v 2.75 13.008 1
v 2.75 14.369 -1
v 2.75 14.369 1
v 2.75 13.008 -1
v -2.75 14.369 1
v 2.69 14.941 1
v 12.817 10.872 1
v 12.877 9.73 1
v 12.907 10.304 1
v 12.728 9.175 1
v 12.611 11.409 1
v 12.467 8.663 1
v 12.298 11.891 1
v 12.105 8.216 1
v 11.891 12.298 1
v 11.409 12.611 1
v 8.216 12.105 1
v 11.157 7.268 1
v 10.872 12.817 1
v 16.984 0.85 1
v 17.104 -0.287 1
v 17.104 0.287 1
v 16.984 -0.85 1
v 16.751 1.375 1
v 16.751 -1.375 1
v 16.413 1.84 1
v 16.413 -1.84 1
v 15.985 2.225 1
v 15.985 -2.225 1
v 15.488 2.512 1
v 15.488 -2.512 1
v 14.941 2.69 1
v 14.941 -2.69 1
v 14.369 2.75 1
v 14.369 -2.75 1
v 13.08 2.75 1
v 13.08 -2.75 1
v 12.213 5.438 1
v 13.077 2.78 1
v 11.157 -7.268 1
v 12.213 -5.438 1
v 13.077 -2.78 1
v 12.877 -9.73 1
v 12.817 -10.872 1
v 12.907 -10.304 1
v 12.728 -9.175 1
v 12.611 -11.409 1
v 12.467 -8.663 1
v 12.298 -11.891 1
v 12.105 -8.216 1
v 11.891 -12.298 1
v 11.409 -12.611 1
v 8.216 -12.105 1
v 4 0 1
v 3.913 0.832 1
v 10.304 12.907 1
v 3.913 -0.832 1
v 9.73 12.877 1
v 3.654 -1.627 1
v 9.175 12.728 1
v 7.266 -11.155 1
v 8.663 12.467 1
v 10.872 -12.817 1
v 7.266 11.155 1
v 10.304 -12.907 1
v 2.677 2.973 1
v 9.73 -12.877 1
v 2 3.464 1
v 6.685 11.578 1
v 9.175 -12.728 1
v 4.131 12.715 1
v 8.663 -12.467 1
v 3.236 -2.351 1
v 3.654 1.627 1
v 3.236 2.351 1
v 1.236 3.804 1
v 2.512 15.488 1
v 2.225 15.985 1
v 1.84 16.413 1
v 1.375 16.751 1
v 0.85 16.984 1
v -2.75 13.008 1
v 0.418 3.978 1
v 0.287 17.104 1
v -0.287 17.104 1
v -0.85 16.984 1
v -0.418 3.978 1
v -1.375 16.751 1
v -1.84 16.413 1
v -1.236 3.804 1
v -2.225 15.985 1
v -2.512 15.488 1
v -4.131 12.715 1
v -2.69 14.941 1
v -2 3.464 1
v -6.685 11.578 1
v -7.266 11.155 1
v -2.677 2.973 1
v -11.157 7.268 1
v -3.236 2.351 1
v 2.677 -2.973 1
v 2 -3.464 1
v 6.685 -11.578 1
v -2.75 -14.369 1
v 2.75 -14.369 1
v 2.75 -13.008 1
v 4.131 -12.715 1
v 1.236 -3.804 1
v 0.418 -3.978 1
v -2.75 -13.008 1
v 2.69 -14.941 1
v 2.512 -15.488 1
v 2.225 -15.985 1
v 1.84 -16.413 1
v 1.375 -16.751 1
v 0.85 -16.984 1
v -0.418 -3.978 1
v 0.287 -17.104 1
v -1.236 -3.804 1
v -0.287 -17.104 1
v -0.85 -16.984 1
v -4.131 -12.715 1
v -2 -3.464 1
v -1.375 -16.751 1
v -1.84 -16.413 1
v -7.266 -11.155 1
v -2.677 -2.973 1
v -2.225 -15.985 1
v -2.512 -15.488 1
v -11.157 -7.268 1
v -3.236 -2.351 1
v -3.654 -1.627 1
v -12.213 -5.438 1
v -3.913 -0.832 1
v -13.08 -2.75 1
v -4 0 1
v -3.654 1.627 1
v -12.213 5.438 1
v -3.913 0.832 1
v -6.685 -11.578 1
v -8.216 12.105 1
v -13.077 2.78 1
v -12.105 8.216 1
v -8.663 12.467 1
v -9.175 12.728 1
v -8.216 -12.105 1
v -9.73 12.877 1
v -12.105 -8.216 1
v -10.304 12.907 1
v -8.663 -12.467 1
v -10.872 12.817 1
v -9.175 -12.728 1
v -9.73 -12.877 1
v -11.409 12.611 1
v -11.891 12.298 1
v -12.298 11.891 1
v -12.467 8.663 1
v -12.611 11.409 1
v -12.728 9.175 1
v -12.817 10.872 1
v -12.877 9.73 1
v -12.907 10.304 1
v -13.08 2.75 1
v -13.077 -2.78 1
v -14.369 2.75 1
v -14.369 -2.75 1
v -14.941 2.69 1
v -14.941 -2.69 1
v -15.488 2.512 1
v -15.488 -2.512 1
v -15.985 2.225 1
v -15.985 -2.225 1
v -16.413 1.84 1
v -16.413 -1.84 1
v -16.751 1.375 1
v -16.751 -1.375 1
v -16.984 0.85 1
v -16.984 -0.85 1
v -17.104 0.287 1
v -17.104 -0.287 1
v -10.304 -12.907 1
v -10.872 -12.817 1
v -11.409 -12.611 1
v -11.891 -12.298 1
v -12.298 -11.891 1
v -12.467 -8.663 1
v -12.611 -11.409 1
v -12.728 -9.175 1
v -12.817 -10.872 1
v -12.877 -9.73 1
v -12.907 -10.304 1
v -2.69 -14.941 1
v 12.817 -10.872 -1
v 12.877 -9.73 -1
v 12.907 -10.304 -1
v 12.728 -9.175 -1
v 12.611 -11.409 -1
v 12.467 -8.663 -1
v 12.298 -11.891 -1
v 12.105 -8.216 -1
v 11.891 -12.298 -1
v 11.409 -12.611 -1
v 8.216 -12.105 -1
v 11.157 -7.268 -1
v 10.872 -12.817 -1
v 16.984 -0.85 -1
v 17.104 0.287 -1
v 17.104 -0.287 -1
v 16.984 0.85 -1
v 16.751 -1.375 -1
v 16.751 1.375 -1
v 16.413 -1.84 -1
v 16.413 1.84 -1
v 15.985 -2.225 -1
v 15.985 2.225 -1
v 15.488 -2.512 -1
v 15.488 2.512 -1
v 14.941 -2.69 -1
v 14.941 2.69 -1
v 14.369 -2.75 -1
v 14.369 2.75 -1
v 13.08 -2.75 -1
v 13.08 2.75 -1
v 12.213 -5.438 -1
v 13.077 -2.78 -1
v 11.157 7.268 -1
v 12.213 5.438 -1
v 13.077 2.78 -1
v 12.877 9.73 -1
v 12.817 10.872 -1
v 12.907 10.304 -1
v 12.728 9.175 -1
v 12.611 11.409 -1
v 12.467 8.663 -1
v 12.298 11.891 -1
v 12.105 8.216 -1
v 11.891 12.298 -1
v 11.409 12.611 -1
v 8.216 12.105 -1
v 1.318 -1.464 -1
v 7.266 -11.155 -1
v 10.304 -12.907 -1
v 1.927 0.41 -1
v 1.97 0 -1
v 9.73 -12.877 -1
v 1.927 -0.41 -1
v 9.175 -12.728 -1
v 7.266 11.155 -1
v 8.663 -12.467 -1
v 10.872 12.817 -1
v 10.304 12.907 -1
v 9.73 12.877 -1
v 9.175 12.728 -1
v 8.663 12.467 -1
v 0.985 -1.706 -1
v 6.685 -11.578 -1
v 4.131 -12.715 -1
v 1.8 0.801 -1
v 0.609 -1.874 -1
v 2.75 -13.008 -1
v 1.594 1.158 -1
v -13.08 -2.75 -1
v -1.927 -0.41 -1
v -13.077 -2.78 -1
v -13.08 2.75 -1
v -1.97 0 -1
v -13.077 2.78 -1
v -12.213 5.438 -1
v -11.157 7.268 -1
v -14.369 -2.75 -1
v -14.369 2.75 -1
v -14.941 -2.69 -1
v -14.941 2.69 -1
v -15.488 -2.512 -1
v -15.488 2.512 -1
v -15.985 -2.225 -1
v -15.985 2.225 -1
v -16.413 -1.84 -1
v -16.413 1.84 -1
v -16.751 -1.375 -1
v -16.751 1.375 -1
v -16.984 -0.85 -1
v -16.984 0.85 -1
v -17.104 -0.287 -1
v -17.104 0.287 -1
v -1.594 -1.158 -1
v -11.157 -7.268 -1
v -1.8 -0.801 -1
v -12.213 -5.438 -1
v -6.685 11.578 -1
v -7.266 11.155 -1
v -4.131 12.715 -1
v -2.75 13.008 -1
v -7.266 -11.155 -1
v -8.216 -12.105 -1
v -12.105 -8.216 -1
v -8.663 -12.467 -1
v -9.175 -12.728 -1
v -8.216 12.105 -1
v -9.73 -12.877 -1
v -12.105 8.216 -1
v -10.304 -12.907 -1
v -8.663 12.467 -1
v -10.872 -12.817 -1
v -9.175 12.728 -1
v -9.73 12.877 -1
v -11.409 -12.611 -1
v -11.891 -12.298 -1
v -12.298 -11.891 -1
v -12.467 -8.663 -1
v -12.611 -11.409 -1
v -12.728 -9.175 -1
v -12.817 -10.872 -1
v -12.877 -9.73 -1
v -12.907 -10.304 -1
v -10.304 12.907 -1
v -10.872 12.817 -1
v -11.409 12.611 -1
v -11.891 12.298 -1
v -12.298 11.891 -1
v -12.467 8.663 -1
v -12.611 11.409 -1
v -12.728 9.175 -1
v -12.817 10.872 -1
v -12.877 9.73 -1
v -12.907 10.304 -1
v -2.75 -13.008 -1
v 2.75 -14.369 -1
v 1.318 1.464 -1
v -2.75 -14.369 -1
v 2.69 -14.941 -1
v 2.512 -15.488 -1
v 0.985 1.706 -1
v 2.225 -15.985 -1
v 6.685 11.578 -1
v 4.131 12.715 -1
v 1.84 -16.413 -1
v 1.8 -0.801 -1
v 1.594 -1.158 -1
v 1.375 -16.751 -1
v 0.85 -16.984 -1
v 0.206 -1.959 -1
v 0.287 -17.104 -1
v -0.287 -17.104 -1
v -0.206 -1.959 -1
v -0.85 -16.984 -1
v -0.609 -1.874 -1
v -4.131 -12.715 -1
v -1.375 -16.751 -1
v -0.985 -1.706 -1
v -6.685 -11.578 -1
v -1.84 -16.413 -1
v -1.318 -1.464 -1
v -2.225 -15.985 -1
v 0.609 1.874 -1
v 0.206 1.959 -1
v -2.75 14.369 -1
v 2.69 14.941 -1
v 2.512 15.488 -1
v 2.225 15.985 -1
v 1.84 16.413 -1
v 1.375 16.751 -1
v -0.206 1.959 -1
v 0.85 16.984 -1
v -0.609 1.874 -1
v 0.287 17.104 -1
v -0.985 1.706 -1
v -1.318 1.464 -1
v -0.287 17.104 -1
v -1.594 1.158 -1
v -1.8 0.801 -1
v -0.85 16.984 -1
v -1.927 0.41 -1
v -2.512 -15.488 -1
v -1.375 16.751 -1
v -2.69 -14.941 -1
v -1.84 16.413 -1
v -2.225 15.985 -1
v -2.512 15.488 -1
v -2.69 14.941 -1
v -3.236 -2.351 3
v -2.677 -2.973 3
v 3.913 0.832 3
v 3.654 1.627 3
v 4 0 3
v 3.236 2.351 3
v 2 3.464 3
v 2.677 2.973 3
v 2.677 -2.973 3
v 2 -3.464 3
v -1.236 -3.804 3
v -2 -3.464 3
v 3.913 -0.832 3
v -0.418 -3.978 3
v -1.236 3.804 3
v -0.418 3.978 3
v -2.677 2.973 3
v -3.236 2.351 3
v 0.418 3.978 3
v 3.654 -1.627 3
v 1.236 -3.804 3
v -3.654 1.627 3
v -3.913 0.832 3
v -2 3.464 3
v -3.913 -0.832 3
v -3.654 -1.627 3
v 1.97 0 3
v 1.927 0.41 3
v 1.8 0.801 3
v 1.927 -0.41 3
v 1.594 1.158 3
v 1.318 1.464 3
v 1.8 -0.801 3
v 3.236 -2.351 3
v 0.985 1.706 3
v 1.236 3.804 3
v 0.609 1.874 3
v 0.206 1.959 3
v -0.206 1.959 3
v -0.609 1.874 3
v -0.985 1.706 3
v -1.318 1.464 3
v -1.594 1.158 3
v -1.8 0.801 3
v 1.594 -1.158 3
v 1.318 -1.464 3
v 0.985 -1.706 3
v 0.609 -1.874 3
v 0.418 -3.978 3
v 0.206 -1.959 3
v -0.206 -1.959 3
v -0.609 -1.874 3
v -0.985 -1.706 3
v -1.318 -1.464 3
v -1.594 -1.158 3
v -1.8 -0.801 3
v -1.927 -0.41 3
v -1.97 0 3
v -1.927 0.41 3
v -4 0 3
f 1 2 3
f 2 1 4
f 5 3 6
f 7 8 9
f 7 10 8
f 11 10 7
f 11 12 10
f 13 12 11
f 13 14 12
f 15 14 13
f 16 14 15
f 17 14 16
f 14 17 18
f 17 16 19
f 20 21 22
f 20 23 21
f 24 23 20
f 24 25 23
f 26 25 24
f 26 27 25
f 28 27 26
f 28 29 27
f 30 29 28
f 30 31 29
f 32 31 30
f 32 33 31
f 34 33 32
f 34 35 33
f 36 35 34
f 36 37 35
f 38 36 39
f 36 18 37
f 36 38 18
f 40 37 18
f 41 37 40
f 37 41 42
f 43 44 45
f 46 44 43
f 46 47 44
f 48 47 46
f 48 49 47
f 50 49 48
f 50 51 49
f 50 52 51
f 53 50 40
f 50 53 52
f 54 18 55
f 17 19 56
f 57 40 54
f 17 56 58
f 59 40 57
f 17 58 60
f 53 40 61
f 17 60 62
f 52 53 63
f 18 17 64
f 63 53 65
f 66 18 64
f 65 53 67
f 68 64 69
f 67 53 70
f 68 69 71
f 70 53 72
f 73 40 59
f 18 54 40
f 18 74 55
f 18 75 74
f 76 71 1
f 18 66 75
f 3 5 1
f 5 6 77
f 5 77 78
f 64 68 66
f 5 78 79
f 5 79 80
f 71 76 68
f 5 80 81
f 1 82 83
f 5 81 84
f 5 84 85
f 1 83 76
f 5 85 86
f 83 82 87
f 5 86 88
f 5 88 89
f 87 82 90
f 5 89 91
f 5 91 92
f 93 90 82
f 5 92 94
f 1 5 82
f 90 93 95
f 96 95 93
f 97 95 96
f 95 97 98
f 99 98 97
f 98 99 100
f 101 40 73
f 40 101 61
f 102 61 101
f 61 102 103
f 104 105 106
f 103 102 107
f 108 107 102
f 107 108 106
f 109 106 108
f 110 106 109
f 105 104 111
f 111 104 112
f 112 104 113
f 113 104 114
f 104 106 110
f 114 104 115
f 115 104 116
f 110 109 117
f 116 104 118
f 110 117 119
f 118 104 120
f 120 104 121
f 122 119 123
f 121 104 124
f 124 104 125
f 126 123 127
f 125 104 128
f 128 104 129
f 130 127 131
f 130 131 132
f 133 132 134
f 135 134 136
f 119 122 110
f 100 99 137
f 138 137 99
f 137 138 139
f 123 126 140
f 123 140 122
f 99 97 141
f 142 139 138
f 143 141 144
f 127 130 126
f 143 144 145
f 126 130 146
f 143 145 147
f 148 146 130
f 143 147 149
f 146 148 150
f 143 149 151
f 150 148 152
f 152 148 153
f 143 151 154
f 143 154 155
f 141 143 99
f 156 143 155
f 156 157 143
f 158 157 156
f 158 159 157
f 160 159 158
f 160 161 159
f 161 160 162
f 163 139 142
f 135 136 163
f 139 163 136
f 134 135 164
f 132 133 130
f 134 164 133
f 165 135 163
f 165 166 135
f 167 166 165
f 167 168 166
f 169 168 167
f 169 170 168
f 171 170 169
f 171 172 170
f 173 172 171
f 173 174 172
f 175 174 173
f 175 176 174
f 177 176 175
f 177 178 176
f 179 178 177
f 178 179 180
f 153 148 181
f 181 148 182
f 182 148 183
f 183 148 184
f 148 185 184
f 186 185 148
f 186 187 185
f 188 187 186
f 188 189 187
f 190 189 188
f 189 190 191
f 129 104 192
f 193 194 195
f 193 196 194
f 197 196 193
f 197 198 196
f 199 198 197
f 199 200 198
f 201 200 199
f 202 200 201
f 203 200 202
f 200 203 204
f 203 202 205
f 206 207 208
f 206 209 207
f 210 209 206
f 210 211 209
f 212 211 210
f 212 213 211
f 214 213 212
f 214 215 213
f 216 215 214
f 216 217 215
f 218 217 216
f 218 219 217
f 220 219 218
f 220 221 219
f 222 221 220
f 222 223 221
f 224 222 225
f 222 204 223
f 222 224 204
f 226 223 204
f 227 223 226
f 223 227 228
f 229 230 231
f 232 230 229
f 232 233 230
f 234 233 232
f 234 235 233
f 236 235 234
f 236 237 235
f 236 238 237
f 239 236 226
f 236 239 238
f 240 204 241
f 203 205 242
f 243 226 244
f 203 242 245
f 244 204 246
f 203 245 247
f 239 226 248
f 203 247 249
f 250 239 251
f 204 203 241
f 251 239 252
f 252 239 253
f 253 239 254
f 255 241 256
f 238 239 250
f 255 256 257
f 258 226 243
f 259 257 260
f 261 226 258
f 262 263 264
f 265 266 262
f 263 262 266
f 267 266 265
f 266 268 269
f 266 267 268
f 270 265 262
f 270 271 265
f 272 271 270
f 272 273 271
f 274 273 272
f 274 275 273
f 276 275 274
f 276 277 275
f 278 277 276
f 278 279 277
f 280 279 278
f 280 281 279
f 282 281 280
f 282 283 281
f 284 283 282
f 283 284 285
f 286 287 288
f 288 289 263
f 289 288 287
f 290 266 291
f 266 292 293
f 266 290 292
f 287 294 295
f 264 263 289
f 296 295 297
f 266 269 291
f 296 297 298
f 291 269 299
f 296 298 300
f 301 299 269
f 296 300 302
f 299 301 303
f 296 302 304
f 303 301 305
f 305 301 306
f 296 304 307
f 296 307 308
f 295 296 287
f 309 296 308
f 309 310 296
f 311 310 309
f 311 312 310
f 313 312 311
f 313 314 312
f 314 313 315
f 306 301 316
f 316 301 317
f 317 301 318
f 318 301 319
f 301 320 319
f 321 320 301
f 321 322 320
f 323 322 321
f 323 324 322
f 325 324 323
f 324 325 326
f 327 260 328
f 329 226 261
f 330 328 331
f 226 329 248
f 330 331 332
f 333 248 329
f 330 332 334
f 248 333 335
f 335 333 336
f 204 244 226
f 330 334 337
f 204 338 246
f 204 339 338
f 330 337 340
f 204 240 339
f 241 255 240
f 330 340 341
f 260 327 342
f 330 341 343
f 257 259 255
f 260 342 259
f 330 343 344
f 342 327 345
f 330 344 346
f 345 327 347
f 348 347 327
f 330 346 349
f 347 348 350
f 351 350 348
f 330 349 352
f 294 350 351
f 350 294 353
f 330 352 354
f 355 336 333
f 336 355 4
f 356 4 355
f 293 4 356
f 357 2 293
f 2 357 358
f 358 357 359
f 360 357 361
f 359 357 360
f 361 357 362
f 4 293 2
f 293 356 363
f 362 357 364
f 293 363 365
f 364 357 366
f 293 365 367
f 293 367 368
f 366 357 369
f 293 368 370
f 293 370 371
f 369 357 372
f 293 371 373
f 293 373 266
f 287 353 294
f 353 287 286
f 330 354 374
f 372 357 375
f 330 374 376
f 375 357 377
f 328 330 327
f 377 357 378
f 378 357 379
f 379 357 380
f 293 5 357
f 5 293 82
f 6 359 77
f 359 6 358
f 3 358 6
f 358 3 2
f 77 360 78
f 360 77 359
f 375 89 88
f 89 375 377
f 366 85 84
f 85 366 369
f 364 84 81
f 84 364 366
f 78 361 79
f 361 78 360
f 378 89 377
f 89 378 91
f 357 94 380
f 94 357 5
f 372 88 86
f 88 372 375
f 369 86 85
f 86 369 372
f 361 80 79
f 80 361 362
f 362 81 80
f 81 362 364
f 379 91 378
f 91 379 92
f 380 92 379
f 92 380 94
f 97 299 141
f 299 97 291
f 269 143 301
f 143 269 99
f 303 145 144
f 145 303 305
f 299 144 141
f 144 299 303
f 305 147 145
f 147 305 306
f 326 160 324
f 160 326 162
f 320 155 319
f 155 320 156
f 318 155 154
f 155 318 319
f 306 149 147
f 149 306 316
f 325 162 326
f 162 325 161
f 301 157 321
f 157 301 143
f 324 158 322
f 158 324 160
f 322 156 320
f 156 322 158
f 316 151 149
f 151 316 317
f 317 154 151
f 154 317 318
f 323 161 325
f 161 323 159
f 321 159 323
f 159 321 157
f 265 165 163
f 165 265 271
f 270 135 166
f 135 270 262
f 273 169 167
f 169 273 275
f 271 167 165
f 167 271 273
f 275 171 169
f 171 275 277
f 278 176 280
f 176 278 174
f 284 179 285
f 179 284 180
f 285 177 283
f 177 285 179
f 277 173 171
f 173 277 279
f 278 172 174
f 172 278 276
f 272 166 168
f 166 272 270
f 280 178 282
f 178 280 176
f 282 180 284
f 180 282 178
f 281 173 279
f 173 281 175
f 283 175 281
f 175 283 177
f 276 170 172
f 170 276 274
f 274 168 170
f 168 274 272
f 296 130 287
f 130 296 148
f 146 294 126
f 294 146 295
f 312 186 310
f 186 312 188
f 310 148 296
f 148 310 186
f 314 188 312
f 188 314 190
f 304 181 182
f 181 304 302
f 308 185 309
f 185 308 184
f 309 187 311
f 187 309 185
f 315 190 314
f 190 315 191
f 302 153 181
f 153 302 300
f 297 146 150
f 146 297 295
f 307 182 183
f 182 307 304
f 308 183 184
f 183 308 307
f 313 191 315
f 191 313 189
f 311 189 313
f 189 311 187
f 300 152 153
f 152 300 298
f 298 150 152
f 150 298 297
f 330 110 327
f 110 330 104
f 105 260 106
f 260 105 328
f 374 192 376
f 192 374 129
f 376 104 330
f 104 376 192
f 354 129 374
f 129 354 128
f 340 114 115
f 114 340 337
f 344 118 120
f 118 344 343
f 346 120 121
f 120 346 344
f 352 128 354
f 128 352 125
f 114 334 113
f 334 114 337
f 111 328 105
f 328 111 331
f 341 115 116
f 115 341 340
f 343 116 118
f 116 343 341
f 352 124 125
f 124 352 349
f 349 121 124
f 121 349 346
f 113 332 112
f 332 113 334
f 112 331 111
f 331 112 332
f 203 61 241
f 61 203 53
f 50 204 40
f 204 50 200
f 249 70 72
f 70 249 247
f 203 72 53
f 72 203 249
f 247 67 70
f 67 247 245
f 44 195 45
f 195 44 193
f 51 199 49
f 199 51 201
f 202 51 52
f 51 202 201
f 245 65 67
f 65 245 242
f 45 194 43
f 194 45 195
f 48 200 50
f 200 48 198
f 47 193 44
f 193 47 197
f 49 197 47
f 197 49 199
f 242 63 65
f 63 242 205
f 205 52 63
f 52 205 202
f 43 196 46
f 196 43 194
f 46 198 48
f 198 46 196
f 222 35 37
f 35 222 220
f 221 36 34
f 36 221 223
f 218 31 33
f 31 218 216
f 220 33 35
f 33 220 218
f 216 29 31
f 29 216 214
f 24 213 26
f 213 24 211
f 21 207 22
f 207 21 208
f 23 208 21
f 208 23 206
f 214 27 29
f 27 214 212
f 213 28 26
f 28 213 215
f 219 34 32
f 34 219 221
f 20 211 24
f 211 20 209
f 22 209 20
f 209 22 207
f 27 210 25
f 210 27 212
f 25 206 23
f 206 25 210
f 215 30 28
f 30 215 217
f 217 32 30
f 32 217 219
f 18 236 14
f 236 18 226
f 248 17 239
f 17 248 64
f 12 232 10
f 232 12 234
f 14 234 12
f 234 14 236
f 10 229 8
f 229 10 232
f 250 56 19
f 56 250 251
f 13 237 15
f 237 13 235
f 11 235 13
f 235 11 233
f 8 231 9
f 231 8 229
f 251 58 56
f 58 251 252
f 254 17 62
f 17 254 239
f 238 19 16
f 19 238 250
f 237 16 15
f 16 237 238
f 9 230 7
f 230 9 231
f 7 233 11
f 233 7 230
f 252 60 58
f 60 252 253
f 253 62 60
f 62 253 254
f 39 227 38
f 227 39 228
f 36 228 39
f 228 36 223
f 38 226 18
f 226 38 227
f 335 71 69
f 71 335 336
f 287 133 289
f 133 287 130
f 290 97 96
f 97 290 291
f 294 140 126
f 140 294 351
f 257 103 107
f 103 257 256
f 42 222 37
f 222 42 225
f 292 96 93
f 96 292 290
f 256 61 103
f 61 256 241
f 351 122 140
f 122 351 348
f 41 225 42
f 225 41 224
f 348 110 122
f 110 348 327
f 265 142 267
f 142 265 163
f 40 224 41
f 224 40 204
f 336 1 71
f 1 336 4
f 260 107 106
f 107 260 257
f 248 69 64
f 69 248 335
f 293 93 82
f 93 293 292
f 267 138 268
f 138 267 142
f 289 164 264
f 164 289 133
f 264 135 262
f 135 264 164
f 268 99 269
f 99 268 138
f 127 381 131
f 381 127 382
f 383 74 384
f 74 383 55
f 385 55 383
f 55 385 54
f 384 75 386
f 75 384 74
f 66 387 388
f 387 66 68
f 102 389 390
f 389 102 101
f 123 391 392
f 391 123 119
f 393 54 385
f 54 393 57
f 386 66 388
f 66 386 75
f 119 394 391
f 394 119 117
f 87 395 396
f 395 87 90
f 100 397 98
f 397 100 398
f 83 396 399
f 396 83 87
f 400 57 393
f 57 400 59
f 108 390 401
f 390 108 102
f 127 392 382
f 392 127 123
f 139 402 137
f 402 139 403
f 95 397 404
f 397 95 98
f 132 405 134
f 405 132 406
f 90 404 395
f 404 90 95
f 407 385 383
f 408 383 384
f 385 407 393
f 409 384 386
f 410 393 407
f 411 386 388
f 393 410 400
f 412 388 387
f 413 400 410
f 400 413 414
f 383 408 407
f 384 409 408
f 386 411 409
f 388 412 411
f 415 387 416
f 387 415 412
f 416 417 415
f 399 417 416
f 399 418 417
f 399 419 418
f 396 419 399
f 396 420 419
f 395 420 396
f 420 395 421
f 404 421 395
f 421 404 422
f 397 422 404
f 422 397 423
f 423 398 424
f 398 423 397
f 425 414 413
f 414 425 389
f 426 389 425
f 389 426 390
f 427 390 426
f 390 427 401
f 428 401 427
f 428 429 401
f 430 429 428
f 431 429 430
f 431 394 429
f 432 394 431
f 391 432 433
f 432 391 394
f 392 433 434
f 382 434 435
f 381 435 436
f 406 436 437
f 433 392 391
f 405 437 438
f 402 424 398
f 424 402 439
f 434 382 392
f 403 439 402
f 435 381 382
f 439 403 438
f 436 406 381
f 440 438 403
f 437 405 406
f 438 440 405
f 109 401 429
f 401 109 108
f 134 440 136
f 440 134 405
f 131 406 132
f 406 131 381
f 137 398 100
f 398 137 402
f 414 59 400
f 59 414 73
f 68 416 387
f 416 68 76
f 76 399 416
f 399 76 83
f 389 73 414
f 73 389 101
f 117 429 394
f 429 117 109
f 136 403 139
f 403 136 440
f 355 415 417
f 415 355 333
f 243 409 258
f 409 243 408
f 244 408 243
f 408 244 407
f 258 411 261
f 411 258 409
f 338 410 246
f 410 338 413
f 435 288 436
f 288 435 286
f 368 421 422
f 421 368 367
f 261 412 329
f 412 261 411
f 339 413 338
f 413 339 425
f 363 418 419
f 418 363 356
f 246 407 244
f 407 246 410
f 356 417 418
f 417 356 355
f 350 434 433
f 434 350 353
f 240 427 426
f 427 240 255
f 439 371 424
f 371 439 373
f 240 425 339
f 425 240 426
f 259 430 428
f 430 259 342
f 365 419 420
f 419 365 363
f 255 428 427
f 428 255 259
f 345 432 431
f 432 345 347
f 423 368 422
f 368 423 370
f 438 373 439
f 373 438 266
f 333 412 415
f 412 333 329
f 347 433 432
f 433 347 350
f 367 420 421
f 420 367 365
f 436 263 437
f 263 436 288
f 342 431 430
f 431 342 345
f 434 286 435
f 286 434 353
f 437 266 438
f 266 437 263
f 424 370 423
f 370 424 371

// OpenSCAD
module pin()
{
    translate(v=[0,84/(2*3.1415926535),0])
    {
      cube(size=[5.5,2,2],center=true);
      translate(v=[0,1,0])
        cylinder(h=2,r=2.75,center=true,$fs=0.1);
    }
}

difference()
{
  union()
  {
    cylinder(h=2,r=84/(2*3.1415926535),center=true,$fs=0.1);
    translate(v=[0,0,1])
      cylinder(h=4,r=4,center=true,$fs=0.1);

    pin();

    rotate([0,0,45])
      pin();

    rotate([0,0,90])
      pin();

    rotate([0,0,135])
      pin();

    rotate([0,0,180])
      pin();

    rotate([0,0,225])
      pin();

    rotate([0,0,270])
      pin();

    rotate([0,0,315])
      pin();
  }

  translate(v=[0,0,1])
    cylinder(h=4,r=1.97,center=true,$fs=0.1);
}
